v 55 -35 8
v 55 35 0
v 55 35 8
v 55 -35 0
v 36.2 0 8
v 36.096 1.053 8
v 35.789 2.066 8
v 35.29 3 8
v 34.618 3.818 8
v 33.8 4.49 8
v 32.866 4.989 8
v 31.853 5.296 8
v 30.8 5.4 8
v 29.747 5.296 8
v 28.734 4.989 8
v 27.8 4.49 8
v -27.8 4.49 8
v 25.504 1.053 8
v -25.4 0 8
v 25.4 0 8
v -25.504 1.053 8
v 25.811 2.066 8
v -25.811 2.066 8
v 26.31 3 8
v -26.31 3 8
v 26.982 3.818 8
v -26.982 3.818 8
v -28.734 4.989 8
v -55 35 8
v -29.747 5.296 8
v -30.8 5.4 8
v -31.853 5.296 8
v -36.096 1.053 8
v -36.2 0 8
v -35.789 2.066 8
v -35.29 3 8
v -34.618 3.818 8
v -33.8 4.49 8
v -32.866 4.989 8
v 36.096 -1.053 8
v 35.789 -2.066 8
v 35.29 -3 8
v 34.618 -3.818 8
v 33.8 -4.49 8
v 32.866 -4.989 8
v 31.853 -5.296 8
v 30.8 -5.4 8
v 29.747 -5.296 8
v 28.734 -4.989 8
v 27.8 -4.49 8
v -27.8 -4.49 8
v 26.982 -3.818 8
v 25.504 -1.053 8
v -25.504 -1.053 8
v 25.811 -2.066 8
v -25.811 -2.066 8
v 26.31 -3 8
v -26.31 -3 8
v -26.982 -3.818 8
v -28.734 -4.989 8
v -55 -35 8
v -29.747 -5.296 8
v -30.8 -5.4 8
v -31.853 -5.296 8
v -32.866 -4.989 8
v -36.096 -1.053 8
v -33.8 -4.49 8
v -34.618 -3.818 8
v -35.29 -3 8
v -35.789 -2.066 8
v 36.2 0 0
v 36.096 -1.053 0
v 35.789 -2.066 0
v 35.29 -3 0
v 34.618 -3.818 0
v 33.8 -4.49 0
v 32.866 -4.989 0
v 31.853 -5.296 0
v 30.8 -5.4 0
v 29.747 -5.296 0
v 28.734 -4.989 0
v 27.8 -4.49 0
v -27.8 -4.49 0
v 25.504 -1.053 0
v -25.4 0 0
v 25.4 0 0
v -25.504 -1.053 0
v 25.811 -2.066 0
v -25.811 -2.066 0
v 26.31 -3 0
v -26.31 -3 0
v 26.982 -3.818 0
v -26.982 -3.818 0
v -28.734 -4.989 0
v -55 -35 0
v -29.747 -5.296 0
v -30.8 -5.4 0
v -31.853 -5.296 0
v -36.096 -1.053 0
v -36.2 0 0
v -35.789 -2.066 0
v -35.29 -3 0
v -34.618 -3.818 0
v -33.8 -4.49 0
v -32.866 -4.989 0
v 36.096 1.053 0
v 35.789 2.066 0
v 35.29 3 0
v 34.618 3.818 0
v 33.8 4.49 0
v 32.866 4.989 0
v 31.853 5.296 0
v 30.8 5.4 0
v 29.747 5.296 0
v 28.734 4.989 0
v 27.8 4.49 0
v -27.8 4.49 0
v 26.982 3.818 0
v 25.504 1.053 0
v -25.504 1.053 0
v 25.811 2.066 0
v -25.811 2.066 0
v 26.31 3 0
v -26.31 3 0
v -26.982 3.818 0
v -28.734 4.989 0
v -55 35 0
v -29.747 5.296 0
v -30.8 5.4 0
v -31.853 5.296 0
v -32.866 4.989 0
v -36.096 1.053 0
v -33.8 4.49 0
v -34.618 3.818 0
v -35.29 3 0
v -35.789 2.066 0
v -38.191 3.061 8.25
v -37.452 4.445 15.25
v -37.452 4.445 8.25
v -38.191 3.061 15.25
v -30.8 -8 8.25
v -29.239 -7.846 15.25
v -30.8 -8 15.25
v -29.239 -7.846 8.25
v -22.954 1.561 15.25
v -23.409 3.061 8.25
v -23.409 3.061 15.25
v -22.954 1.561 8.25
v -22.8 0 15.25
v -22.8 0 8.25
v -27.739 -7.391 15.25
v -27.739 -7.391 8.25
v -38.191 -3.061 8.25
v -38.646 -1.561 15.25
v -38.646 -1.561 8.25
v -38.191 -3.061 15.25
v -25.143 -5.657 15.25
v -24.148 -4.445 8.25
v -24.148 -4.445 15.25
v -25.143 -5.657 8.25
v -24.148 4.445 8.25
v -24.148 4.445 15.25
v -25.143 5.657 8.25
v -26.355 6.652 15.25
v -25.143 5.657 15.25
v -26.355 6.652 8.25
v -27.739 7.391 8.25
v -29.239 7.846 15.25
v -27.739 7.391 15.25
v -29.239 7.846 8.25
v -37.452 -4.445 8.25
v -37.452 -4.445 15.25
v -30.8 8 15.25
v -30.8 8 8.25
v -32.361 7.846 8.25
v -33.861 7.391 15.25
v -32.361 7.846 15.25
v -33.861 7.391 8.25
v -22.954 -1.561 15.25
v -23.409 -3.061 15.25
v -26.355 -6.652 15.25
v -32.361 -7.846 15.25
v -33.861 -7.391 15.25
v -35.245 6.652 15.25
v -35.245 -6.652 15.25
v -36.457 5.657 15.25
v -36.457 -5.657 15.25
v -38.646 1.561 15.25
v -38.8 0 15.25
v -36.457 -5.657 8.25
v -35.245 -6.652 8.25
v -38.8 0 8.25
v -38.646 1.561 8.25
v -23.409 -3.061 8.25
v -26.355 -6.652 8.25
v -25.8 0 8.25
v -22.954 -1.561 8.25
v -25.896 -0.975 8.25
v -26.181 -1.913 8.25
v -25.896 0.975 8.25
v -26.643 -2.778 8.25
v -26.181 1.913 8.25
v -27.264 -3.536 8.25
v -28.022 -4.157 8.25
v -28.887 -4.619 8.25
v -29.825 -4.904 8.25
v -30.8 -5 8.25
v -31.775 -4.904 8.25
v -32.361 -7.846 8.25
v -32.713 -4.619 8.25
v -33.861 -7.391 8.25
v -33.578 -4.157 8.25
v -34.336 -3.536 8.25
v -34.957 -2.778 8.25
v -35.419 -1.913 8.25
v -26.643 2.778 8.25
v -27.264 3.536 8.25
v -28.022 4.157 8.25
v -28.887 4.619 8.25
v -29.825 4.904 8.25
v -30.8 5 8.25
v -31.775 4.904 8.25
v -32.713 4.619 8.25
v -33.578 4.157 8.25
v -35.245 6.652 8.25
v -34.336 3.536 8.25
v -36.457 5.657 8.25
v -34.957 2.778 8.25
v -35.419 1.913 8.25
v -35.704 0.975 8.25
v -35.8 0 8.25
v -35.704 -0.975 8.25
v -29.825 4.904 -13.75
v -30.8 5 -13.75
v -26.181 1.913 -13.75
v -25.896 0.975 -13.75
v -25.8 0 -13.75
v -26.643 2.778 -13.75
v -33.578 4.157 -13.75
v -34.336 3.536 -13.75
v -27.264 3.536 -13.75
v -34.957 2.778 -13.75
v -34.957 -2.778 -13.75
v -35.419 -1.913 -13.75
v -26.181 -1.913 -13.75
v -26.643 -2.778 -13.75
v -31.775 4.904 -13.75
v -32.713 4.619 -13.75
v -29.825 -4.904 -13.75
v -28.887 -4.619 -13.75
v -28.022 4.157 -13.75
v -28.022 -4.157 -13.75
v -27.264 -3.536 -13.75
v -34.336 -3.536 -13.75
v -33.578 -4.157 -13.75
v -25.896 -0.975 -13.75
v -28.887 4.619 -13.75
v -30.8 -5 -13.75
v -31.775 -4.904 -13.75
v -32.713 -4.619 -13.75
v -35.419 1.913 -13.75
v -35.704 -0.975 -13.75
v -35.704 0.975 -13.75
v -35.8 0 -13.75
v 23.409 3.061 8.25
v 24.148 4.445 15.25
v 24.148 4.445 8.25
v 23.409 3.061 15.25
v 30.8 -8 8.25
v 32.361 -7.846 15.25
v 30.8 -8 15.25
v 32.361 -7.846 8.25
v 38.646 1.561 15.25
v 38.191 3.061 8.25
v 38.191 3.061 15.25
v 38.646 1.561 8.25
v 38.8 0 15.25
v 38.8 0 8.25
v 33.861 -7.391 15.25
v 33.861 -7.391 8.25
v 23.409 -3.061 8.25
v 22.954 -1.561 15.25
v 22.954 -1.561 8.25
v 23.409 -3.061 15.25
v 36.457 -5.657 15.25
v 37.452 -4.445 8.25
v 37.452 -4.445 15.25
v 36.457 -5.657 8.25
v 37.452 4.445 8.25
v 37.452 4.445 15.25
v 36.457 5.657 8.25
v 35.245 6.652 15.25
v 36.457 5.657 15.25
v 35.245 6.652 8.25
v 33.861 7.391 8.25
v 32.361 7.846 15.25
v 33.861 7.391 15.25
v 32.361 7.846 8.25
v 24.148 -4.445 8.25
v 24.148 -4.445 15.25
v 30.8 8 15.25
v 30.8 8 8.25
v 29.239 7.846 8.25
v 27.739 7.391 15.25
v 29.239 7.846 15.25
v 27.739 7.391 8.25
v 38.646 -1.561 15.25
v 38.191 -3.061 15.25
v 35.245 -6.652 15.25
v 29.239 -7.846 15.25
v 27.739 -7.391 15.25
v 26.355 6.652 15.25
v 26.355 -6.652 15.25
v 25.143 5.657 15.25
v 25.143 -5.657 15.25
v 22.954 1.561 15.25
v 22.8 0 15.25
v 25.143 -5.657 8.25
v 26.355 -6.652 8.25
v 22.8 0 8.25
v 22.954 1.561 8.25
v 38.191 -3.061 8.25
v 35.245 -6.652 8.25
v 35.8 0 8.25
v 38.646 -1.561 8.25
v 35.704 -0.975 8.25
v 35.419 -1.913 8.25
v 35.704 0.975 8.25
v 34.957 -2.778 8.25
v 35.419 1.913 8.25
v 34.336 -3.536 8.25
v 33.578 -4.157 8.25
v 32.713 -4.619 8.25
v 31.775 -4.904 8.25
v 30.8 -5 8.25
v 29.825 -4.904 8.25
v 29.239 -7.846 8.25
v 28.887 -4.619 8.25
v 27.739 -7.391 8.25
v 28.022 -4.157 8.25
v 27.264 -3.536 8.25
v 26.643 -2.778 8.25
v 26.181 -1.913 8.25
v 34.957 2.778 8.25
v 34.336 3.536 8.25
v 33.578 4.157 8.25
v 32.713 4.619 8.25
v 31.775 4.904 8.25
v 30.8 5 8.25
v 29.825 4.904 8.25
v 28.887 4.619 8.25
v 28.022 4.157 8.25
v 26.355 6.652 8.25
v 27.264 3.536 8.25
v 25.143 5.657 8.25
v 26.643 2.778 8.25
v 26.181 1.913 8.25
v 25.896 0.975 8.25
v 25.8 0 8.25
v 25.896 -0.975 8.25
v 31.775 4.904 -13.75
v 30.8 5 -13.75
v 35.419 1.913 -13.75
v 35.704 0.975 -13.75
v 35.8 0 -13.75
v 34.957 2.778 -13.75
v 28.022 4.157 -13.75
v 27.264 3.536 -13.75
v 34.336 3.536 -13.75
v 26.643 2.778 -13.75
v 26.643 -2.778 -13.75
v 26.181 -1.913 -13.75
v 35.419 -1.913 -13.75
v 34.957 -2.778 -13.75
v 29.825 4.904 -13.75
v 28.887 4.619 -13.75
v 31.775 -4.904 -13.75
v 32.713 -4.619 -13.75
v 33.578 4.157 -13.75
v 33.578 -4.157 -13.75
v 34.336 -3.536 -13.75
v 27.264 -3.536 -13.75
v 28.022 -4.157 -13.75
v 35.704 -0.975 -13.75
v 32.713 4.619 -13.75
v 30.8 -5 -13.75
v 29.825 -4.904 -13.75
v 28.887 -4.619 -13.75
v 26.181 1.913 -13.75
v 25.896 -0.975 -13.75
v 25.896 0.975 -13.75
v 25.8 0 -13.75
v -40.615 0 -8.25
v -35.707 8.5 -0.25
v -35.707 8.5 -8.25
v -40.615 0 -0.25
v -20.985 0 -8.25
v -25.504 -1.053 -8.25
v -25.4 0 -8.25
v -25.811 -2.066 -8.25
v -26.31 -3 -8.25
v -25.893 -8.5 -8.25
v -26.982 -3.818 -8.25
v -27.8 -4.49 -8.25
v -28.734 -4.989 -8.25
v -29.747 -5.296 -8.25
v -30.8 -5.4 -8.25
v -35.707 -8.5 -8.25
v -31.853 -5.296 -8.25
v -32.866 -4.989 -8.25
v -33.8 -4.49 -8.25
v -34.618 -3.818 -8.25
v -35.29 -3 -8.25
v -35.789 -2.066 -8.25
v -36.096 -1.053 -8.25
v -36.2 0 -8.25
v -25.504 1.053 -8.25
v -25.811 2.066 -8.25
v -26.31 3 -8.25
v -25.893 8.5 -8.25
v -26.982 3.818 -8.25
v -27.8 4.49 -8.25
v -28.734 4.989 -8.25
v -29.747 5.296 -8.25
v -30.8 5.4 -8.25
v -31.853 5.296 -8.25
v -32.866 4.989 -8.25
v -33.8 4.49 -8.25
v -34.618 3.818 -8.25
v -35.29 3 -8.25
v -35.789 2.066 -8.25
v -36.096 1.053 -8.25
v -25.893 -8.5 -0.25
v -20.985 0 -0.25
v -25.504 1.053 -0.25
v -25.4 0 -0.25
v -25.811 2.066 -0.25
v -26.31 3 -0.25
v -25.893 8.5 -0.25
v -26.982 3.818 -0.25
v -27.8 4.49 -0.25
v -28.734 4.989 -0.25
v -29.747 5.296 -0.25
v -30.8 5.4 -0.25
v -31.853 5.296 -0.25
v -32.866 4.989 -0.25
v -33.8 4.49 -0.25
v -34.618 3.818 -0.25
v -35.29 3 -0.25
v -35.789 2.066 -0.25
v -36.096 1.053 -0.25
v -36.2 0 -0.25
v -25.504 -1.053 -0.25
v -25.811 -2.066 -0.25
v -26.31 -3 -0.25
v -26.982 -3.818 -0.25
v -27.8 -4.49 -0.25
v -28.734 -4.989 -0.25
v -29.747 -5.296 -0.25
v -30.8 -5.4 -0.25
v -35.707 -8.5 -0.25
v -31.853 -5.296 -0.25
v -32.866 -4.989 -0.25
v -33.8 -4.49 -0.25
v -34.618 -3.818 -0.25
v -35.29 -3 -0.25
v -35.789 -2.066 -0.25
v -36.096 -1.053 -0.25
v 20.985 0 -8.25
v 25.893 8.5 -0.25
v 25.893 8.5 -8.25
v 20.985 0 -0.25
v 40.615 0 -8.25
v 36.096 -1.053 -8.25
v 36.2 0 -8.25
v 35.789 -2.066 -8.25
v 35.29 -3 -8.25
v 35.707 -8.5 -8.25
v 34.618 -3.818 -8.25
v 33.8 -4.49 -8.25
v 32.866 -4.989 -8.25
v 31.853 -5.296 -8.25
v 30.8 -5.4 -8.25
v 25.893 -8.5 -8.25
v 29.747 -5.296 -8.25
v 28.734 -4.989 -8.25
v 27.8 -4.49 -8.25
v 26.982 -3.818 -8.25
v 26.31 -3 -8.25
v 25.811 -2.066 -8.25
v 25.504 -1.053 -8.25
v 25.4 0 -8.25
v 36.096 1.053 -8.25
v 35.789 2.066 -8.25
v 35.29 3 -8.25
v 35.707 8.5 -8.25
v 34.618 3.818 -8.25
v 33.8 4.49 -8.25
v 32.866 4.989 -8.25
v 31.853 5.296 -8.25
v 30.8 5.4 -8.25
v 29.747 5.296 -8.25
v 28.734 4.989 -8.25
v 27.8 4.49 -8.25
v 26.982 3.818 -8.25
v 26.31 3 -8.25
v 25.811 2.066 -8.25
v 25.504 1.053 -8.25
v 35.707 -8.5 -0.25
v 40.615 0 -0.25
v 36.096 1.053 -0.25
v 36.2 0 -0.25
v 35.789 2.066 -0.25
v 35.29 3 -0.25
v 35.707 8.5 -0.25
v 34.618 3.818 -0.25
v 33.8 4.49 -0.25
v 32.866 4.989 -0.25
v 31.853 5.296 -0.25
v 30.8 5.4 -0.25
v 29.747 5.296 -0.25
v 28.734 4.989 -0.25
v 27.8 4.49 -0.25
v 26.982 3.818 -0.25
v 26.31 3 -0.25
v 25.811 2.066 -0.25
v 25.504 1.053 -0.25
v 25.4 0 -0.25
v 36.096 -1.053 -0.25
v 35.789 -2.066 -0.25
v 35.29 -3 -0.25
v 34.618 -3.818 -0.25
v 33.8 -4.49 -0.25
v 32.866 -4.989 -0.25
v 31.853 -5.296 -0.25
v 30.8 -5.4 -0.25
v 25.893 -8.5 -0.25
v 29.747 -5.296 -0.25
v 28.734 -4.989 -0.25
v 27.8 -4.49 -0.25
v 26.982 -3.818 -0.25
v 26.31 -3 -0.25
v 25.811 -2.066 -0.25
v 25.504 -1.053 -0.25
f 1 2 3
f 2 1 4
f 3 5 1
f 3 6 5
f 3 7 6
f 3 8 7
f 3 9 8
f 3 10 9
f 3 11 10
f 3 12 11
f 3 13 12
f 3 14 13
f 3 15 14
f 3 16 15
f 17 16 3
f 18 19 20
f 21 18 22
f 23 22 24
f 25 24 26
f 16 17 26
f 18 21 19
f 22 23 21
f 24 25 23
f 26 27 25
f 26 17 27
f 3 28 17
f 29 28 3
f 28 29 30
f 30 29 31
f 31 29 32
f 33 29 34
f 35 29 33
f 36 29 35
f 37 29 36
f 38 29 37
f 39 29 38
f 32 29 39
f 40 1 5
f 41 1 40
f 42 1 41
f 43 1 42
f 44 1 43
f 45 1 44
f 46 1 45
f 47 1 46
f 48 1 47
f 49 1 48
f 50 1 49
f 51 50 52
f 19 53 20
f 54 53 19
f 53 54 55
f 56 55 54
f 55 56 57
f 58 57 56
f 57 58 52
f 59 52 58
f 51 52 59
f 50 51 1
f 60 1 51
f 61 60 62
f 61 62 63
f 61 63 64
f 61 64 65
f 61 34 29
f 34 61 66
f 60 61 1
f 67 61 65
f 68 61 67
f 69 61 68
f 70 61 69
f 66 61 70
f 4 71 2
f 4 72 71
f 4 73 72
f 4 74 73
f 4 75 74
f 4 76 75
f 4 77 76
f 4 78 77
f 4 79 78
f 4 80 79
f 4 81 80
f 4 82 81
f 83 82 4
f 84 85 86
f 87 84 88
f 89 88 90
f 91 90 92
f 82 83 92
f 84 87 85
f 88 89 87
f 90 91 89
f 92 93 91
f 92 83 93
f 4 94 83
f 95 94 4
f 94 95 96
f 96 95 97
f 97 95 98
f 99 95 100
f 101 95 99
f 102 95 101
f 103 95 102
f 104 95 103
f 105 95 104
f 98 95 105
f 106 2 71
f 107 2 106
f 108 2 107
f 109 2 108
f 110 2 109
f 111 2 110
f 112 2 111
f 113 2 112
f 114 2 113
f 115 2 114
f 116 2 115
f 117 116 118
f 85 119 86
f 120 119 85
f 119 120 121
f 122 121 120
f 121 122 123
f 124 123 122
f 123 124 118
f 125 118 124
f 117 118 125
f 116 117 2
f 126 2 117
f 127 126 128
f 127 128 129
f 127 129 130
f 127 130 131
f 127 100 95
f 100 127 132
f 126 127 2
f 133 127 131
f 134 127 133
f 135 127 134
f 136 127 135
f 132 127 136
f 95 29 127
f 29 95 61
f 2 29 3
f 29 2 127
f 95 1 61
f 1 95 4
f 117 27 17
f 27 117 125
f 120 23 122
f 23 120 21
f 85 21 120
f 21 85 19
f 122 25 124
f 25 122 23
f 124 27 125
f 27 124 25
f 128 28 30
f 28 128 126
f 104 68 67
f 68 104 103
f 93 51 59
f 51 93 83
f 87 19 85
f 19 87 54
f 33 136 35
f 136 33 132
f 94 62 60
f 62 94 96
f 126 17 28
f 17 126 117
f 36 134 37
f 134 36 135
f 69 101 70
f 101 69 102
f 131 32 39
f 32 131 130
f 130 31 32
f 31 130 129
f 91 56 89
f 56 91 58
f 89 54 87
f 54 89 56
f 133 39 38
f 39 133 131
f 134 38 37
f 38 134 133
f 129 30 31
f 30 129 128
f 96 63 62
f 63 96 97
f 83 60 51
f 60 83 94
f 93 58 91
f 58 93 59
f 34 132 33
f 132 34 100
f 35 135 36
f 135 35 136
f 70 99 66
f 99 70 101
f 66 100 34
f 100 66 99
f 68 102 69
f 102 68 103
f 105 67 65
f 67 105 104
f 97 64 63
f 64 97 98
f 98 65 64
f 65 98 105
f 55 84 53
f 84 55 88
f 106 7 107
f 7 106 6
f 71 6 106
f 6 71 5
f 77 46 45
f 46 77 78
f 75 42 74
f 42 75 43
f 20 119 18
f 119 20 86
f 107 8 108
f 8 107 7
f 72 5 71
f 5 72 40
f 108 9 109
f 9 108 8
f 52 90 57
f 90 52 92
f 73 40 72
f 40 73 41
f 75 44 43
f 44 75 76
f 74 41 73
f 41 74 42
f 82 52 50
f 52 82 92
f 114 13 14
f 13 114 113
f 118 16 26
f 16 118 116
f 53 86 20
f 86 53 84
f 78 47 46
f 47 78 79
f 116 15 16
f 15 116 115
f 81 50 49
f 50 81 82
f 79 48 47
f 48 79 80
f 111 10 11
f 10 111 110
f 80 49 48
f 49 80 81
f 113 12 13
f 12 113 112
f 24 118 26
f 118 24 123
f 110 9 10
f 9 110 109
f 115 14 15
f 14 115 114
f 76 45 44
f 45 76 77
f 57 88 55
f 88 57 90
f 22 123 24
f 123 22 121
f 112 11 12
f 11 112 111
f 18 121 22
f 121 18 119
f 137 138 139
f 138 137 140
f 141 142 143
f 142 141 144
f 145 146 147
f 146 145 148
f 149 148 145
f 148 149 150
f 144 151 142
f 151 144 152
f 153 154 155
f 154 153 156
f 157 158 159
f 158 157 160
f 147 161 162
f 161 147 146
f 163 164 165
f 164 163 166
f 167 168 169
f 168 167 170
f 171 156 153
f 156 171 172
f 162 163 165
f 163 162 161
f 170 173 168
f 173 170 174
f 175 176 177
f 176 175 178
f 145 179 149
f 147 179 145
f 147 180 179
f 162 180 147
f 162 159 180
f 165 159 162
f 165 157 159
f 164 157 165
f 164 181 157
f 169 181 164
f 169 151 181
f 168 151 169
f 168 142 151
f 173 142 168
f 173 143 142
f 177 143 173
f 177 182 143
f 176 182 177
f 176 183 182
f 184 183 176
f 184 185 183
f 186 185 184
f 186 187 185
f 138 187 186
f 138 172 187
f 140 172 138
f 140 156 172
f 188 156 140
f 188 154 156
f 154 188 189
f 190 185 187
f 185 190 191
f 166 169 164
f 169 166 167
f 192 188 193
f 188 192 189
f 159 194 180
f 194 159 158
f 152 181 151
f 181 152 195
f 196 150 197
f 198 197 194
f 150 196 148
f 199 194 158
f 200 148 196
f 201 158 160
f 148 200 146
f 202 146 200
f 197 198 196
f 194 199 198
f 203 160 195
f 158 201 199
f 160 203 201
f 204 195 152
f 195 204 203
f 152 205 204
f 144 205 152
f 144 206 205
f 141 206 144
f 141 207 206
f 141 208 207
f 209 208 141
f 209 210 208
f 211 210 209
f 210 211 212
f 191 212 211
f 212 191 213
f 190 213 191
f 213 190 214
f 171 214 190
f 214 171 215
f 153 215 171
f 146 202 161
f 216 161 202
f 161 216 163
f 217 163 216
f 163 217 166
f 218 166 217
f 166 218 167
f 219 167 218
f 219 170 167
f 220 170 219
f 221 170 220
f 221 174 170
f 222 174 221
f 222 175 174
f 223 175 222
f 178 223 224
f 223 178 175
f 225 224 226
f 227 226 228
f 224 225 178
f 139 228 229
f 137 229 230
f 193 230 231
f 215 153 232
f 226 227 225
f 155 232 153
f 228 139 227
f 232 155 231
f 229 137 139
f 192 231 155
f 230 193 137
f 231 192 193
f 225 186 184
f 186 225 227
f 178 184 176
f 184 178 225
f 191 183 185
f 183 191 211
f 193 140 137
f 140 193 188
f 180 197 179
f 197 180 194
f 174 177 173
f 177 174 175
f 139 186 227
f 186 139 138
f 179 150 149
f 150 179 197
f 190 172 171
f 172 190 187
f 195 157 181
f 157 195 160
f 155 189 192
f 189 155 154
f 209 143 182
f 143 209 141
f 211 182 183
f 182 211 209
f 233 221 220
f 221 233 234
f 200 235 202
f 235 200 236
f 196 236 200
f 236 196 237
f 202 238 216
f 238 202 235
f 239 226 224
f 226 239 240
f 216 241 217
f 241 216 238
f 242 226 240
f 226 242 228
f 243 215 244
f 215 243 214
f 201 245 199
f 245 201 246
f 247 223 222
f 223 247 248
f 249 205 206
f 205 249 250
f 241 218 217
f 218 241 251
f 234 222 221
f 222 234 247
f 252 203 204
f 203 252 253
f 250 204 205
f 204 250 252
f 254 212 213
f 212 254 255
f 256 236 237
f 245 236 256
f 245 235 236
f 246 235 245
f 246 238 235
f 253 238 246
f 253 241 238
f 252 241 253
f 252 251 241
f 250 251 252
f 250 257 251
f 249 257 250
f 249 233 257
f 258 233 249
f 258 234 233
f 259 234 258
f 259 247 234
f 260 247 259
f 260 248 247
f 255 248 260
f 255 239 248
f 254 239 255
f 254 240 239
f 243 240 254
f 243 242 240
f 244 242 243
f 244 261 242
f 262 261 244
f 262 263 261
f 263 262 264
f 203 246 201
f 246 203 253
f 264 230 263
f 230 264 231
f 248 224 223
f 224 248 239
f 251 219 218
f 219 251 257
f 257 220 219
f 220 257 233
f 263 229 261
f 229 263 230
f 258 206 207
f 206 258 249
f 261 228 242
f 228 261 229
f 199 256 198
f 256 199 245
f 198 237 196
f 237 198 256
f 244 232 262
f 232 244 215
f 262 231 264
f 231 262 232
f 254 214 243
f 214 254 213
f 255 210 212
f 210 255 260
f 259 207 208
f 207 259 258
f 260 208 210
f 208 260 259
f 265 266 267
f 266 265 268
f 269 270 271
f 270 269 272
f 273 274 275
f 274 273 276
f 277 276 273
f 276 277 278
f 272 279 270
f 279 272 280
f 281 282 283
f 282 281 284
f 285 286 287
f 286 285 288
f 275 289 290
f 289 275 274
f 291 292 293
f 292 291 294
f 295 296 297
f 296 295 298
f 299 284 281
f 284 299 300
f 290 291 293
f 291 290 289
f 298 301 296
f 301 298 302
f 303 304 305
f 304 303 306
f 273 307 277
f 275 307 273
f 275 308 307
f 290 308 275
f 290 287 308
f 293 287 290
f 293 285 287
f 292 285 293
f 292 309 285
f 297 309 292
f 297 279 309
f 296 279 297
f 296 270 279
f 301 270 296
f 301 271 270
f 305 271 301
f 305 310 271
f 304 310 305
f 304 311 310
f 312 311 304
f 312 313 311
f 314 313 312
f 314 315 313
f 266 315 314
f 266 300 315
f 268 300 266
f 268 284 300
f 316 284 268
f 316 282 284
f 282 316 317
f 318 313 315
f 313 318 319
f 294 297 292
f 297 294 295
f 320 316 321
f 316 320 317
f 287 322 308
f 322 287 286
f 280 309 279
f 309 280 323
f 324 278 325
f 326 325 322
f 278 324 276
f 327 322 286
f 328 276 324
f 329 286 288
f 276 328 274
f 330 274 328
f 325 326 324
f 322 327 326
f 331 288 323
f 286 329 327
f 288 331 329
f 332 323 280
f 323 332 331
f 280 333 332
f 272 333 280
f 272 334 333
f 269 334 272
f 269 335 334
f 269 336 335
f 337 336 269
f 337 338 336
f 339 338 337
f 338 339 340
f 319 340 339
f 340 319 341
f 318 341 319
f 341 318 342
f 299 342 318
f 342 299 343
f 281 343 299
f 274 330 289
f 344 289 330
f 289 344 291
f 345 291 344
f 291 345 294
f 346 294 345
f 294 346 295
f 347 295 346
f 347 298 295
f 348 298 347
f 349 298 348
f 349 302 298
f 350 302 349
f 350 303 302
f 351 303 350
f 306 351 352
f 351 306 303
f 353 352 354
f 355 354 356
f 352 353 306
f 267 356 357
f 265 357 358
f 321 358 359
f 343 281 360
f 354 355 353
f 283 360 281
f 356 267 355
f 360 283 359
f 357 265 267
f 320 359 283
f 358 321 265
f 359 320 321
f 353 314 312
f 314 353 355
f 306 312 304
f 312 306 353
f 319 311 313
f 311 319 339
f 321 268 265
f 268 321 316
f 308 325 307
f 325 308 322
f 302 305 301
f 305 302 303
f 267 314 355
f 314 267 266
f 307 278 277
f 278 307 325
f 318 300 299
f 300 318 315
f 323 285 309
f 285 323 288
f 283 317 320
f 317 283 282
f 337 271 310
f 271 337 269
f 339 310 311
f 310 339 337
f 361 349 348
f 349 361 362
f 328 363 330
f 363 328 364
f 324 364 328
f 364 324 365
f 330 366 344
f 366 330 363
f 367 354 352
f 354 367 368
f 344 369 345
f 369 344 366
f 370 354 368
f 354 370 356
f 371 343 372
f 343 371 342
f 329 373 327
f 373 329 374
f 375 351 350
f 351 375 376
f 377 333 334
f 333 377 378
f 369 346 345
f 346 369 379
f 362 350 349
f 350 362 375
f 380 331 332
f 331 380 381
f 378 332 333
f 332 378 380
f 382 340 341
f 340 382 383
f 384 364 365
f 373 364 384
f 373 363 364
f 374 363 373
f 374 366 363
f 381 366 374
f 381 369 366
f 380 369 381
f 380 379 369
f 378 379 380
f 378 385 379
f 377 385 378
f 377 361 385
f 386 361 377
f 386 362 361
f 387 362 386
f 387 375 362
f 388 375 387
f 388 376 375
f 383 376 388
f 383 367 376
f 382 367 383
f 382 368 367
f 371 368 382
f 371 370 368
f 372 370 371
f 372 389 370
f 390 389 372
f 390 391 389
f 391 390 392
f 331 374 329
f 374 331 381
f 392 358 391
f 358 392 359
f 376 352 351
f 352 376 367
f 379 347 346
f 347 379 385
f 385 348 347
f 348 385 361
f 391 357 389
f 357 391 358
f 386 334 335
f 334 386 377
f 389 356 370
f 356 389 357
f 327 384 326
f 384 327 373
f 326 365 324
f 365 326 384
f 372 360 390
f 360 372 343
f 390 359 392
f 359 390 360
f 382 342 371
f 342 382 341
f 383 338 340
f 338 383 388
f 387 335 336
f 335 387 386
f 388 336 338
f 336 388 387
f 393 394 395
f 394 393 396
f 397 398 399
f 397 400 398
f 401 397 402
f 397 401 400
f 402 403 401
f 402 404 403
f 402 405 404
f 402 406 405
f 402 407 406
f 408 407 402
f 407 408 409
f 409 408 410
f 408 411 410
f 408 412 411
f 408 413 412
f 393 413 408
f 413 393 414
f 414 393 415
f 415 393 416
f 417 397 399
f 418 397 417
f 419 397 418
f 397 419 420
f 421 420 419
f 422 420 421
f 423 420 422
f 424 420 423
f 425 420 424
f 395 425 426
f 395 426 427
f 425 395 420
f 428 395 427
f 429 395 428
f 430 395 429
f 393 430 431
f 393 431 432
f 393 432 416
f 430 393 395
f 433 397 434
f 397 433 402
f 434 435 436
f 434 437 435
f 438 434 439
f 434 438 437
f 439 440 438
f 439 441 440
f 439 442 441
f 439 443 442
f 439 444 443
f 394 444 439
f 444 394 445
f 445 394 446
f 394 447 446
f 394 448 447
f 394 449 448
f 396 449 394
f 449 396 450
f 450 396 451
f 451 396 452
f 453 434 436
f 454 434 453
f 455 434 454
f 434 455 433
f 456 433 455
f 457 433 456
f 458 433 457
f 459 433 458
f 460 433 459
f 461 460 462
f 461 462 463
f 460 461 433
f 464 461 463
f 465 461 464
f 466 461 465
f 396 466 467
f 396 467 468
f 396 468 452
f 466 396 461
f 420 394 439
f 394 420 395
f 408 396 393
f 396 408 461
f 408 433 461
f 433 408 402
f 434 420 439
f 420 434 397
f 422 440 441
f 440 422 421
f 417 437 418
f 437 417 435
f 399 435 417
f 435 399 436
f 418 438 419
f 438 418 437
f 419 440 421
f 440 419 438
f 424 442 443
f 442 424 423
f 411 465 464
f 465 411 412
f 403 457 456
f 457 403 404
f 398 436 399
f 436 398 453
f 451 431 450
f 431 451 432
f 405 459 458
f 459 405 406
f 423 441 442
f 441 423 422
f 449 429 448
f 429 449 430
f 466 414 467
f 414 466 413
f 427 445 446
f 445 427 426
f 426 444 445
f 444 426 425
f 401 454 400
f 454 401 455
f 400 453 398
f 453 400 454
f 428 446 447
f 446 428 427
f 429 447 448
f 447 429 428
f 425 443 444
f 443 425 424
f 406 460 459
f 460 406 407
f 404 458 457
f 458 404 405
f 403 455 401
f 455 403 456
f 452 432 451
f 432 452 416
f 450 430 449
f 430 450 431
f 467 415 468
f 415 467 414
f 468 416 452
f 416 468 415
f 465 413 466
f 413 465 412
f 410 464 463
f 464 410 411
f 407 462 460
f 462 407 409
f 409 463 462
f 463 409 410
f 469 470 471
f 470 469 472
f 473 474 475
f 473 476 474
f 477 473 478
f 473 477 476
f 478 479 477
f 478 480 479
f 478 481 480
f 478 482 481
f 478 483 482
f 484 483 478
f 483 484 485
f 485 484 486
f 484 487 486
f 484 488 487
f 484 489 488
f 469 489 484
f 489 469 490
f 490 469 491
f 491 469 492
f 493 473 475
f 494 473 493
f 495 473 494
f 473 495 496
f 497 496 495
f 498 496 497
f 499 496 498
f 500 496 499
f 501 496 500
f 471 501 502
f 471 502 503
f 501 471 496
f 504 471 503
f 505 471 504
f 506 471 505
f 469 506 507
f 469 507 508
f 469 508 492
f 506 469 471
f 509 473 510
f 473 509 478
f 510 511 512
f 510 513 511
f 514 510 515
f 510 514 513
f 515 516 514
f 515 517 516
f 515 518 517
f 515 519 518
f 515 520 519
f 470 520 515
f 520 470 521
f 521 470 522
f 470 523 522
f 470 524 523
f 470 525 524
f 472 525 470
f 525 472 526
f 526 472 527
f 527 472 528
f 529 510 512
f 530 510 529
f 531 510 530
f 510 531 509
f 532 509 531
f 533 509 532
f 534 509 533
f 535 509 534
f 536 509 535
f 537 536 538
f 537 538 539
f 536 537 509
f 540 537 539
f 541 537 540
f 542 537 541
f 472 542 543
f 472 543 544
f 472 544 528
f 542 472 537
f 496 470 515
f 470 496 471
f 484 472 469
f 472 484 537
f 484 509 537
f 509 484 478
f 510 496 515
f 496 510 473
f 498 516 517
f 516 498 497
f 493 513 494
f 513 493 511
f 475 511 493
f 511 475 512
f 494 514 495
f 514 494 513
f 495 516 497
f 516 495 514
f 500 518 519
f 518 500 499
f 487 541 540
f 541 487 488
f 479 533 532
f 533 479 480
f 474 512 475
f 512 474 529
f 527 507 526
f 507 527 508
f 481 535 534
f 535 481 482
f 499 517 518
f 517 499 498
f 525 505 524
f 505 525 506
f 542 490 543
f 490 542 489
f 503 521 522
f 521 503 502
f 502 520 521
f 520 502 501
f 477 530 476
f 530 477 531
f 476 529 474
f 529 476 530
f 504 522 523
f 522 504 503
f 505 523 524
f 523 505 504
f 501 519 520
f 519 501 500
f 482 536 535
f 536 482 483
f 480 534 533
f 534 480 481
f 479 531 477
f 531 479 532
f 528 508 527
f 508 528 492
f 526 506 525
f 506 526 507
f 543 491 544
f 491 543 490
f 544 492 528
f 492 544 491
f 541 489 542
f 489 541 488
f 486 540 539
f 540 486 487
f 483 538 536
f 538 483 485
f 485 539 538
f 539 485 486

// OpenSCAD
$fn = 32;

// ------------------------------------------------------------------------
// Bolted plate: 110 x 70 x 8 mm plate, 2 fasteners
// Every part is its own module, assembly() places them once.
// ------------------------------------------------------------------------

// --- part 1 ---
module plate() {
  difference() {
    translate([-55, -35, 0]) cube([110, 70, 8]);
    translate([-30.8, 0, -1]) cylinder(h = 10, d = 10.8);
    translate([30.8, 0, -1]) cylinder(h = 10, d = 10.8);
  }
}

// --- part 2 ---
module bolt1() {
  cylinder(h = 7, d = 16);
  translate([0, 0, -22]) cylinder(h = 22, d = 10);
}

// --- part 3 ---
module bolt2() {
  cylinder(h = 7, d = 16);
  translate([0, 0, -22]) cylinder(h = 22, d = 10);
}

// --- part 4 ---
module nut1() {
  difference() {
    linear_extrude(height = 8) polygon(points = [[9.815, 0], [4.907, 8.5], [-4.907, 8.5], [-9.815, 0], [-4.907, -8.5], [4.907, -8.5]]);
    translate([0, 0, -1]) cylinder(h = 10, d = 10.8);
  }
}

// --- part 5 ---
module nut2() {
  difference() {
    linear_extrude(height = 8) polygon(points = [[9.815, 0], [4.907, 8.5], [-4.907, 8.5], [-9.815, 0], [-4.907, -8.5], [4.907, -8.5]]);
    translate([0, 0, -1]) cylinder(h = 10, d = 10.8);
  }
}

// --- assembly ---
module assembly() {
  translate([0, 0, 0]) rotate([0, 0, 0]) plate();
  translate([-30.8, 0, 8.25]) rotate([0, 0, 0]) bolt1();
  translate([30.8, 0, 8.25]) rotate([0, 0, 0]) bolt2();
  translate([-30.8, 0, -8.25]) rotate([0, 0, 0]) nut1();
  translate([30.8, 0, -8.25]) rotate([0, 0, 0]) nut2();
}

assembly();
